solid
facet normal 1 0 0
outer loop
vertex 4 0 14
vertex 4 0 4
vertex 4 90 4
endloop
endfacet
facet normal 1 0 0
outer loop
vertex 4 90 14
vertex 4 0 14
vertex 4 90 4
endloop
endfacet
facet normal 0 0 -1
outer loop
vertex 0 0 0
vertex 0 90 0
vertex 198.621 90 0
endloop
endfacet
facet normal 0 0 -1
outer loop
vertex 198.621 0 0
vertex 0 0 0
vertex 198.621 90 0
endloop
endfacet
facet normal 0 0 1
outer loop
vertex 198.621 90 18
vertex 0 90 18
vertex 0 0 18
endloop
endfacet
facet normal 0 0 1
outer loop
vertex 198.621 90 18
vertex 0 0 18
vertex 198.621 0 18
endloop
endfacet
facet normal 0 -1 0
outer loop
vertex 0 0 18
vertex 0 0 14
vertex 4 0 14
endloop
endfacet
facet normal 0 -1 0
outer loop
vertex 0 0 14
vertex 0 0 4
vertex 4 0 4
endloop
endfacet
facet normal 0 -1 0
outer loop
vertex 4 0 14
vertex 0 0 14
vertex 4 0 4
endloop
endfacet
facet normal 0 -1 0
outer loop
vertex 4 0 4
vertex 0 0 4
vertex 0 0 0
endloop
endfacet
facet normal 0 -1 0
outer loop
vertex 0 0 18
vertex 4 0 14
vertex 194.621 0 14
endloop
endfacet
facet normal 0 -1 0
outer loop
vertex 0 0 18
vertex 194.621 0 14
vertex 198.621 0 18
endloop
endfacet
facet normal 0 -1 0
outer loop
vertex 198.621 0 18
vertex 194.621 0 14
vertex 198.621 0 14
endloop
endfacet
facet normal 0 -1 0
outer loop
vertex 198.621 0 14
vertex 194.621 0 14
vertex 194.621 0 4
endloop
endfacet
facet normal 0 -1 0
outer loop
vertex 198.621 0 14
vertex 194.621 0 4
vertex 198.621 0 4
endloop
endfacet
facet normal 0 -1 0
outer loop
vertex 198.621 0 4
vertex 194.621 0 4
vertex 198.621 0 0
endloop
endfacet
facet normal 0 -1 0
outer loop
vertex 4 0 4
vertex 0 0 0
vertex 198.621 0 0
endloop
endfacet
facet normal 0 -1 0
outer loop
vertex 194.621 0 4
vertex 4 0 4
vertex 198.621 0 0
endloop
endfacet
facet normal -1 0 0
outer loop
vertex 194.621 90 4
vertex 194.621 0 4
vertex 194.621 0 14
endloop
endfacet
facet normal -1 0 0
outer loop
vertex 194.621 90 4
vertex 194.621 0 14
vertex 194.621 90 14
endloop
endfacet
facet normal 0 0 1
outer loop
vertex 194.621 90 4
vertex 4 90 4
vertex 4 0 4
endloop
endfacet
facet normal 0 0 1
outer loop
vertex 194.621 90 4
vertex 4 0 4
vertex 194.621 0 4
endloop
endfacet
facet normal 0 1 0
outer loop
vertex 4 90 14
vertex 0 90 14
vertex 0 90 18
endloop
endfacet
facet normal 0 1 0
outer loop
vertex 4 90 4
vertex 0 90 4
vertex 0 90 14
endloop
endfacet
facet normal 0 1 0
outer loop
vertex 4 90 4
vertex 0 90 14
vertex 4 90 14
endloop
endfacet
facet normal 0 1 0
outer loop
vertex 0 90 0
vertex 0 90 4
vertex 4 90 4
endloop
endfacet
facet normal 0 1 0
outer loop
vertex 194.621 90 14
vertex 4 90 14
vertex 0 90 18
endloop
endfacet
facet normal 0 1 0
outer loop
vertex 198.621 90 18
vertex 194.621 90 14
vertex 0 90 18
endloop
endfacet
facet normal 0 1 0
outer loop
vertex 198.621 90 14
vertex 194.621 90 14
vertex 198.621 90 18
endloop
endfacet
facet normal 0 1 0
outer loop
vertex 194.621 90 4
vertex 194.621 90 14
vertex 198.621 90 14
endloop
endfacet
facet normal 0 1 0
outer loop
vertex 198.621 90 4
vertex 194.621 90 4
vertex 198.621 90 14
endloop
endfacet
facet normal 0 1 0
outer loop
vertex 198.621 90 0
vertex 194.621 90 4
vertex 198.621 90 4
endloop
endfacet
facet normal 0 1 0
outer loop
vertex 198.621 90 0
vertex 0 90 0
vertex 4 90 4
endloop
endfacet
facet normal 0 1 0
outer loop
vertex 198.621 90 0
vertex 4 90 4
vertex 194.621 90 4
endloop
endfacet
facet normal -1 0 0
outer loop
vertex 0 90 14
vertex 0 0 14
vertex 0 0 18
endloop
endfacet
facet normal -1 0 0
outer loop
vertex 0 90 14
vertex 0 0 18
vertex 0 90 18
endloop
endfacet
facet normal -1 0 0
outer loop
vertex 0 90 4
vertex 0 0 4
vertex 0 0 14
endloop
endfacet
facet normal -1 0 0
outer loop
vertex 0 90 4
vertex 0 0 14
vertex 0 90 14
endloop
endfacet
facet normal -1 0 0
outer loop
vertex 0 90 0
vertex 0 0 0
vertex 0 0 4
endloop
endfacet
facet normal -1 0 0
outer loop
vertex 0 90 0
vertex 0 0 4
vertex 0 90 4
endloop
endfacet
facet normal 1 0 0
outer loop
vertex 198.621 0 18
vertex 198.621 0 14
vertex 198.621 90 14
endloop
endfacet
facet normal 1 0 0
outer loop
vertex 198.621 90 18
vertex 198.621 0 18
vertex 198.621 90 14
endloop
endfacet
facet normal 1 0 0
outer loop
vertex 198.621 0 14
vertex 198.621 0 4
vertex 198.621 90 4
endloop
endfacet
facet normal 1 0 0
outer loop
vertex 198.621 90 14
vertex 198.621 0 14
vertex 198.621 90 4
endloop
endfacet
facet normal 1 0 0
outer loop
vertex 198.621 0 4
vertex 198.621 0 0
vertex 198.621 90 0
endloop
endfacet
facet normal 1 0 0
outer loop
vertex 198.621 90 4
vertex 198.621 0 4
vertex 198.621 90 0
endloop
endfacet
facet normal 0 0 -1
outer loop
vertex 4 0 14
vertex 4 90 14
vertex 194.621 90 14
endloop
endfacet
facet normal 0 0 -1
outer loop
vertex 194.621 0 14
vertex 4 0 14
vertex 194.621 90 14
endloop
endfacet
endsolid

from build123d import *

# Parameters (mm, degrees)
SKETCH1_W           = 198.621366483
SKETCH1_H           = 90
BOSS_EXTRUDE1_DEPTH = 4
SKETCH3_W           = 4
SKETCH3_H           = 90
BOSS_EXTRUDE2_DEPTH = 10
SKETCH21_W          = 198.621366483
SKETCH21_H          = 90
BOSS_EXTRUDE3_DEPTH = 4


with BuildPart() as part:
    # Sketch1 → Boss-Extrude1 (new body)
    with BuildSketch(Plane.XY):
        with Locations((99.310683242, 45)):
            Rectangle(SKETCH1_W, SKETCH1_H)
    extrude(amount=BOSS_EXTRUDE1_DEPTH)

    # Sketch3 → Boss-Extrude2 (add)
    with BuildSketch(Plane.XY.offset(4)):
        with Locations((2, 45)):
            Rectangle(SKETCH3_W, SKETCH3_H)
        with Locations((196.621366483, 45)):
            Rectangle(SKETCH3_W, SKETCH3_H)
    extrude(amount=BOSS_EXTRUDE2_DEPTH)

    # Sketch21 → Boss-Extrude3 (add)
    with BuildSketch(Plane.XY.offset(14)):
        with Locations((99.310683242, 45)):
            Rectangle(SKETCH21_W, SKETCH21_H)
    extrude(amount=BOSS_EXTRUDE3_DEPTH)


solid = part.part
